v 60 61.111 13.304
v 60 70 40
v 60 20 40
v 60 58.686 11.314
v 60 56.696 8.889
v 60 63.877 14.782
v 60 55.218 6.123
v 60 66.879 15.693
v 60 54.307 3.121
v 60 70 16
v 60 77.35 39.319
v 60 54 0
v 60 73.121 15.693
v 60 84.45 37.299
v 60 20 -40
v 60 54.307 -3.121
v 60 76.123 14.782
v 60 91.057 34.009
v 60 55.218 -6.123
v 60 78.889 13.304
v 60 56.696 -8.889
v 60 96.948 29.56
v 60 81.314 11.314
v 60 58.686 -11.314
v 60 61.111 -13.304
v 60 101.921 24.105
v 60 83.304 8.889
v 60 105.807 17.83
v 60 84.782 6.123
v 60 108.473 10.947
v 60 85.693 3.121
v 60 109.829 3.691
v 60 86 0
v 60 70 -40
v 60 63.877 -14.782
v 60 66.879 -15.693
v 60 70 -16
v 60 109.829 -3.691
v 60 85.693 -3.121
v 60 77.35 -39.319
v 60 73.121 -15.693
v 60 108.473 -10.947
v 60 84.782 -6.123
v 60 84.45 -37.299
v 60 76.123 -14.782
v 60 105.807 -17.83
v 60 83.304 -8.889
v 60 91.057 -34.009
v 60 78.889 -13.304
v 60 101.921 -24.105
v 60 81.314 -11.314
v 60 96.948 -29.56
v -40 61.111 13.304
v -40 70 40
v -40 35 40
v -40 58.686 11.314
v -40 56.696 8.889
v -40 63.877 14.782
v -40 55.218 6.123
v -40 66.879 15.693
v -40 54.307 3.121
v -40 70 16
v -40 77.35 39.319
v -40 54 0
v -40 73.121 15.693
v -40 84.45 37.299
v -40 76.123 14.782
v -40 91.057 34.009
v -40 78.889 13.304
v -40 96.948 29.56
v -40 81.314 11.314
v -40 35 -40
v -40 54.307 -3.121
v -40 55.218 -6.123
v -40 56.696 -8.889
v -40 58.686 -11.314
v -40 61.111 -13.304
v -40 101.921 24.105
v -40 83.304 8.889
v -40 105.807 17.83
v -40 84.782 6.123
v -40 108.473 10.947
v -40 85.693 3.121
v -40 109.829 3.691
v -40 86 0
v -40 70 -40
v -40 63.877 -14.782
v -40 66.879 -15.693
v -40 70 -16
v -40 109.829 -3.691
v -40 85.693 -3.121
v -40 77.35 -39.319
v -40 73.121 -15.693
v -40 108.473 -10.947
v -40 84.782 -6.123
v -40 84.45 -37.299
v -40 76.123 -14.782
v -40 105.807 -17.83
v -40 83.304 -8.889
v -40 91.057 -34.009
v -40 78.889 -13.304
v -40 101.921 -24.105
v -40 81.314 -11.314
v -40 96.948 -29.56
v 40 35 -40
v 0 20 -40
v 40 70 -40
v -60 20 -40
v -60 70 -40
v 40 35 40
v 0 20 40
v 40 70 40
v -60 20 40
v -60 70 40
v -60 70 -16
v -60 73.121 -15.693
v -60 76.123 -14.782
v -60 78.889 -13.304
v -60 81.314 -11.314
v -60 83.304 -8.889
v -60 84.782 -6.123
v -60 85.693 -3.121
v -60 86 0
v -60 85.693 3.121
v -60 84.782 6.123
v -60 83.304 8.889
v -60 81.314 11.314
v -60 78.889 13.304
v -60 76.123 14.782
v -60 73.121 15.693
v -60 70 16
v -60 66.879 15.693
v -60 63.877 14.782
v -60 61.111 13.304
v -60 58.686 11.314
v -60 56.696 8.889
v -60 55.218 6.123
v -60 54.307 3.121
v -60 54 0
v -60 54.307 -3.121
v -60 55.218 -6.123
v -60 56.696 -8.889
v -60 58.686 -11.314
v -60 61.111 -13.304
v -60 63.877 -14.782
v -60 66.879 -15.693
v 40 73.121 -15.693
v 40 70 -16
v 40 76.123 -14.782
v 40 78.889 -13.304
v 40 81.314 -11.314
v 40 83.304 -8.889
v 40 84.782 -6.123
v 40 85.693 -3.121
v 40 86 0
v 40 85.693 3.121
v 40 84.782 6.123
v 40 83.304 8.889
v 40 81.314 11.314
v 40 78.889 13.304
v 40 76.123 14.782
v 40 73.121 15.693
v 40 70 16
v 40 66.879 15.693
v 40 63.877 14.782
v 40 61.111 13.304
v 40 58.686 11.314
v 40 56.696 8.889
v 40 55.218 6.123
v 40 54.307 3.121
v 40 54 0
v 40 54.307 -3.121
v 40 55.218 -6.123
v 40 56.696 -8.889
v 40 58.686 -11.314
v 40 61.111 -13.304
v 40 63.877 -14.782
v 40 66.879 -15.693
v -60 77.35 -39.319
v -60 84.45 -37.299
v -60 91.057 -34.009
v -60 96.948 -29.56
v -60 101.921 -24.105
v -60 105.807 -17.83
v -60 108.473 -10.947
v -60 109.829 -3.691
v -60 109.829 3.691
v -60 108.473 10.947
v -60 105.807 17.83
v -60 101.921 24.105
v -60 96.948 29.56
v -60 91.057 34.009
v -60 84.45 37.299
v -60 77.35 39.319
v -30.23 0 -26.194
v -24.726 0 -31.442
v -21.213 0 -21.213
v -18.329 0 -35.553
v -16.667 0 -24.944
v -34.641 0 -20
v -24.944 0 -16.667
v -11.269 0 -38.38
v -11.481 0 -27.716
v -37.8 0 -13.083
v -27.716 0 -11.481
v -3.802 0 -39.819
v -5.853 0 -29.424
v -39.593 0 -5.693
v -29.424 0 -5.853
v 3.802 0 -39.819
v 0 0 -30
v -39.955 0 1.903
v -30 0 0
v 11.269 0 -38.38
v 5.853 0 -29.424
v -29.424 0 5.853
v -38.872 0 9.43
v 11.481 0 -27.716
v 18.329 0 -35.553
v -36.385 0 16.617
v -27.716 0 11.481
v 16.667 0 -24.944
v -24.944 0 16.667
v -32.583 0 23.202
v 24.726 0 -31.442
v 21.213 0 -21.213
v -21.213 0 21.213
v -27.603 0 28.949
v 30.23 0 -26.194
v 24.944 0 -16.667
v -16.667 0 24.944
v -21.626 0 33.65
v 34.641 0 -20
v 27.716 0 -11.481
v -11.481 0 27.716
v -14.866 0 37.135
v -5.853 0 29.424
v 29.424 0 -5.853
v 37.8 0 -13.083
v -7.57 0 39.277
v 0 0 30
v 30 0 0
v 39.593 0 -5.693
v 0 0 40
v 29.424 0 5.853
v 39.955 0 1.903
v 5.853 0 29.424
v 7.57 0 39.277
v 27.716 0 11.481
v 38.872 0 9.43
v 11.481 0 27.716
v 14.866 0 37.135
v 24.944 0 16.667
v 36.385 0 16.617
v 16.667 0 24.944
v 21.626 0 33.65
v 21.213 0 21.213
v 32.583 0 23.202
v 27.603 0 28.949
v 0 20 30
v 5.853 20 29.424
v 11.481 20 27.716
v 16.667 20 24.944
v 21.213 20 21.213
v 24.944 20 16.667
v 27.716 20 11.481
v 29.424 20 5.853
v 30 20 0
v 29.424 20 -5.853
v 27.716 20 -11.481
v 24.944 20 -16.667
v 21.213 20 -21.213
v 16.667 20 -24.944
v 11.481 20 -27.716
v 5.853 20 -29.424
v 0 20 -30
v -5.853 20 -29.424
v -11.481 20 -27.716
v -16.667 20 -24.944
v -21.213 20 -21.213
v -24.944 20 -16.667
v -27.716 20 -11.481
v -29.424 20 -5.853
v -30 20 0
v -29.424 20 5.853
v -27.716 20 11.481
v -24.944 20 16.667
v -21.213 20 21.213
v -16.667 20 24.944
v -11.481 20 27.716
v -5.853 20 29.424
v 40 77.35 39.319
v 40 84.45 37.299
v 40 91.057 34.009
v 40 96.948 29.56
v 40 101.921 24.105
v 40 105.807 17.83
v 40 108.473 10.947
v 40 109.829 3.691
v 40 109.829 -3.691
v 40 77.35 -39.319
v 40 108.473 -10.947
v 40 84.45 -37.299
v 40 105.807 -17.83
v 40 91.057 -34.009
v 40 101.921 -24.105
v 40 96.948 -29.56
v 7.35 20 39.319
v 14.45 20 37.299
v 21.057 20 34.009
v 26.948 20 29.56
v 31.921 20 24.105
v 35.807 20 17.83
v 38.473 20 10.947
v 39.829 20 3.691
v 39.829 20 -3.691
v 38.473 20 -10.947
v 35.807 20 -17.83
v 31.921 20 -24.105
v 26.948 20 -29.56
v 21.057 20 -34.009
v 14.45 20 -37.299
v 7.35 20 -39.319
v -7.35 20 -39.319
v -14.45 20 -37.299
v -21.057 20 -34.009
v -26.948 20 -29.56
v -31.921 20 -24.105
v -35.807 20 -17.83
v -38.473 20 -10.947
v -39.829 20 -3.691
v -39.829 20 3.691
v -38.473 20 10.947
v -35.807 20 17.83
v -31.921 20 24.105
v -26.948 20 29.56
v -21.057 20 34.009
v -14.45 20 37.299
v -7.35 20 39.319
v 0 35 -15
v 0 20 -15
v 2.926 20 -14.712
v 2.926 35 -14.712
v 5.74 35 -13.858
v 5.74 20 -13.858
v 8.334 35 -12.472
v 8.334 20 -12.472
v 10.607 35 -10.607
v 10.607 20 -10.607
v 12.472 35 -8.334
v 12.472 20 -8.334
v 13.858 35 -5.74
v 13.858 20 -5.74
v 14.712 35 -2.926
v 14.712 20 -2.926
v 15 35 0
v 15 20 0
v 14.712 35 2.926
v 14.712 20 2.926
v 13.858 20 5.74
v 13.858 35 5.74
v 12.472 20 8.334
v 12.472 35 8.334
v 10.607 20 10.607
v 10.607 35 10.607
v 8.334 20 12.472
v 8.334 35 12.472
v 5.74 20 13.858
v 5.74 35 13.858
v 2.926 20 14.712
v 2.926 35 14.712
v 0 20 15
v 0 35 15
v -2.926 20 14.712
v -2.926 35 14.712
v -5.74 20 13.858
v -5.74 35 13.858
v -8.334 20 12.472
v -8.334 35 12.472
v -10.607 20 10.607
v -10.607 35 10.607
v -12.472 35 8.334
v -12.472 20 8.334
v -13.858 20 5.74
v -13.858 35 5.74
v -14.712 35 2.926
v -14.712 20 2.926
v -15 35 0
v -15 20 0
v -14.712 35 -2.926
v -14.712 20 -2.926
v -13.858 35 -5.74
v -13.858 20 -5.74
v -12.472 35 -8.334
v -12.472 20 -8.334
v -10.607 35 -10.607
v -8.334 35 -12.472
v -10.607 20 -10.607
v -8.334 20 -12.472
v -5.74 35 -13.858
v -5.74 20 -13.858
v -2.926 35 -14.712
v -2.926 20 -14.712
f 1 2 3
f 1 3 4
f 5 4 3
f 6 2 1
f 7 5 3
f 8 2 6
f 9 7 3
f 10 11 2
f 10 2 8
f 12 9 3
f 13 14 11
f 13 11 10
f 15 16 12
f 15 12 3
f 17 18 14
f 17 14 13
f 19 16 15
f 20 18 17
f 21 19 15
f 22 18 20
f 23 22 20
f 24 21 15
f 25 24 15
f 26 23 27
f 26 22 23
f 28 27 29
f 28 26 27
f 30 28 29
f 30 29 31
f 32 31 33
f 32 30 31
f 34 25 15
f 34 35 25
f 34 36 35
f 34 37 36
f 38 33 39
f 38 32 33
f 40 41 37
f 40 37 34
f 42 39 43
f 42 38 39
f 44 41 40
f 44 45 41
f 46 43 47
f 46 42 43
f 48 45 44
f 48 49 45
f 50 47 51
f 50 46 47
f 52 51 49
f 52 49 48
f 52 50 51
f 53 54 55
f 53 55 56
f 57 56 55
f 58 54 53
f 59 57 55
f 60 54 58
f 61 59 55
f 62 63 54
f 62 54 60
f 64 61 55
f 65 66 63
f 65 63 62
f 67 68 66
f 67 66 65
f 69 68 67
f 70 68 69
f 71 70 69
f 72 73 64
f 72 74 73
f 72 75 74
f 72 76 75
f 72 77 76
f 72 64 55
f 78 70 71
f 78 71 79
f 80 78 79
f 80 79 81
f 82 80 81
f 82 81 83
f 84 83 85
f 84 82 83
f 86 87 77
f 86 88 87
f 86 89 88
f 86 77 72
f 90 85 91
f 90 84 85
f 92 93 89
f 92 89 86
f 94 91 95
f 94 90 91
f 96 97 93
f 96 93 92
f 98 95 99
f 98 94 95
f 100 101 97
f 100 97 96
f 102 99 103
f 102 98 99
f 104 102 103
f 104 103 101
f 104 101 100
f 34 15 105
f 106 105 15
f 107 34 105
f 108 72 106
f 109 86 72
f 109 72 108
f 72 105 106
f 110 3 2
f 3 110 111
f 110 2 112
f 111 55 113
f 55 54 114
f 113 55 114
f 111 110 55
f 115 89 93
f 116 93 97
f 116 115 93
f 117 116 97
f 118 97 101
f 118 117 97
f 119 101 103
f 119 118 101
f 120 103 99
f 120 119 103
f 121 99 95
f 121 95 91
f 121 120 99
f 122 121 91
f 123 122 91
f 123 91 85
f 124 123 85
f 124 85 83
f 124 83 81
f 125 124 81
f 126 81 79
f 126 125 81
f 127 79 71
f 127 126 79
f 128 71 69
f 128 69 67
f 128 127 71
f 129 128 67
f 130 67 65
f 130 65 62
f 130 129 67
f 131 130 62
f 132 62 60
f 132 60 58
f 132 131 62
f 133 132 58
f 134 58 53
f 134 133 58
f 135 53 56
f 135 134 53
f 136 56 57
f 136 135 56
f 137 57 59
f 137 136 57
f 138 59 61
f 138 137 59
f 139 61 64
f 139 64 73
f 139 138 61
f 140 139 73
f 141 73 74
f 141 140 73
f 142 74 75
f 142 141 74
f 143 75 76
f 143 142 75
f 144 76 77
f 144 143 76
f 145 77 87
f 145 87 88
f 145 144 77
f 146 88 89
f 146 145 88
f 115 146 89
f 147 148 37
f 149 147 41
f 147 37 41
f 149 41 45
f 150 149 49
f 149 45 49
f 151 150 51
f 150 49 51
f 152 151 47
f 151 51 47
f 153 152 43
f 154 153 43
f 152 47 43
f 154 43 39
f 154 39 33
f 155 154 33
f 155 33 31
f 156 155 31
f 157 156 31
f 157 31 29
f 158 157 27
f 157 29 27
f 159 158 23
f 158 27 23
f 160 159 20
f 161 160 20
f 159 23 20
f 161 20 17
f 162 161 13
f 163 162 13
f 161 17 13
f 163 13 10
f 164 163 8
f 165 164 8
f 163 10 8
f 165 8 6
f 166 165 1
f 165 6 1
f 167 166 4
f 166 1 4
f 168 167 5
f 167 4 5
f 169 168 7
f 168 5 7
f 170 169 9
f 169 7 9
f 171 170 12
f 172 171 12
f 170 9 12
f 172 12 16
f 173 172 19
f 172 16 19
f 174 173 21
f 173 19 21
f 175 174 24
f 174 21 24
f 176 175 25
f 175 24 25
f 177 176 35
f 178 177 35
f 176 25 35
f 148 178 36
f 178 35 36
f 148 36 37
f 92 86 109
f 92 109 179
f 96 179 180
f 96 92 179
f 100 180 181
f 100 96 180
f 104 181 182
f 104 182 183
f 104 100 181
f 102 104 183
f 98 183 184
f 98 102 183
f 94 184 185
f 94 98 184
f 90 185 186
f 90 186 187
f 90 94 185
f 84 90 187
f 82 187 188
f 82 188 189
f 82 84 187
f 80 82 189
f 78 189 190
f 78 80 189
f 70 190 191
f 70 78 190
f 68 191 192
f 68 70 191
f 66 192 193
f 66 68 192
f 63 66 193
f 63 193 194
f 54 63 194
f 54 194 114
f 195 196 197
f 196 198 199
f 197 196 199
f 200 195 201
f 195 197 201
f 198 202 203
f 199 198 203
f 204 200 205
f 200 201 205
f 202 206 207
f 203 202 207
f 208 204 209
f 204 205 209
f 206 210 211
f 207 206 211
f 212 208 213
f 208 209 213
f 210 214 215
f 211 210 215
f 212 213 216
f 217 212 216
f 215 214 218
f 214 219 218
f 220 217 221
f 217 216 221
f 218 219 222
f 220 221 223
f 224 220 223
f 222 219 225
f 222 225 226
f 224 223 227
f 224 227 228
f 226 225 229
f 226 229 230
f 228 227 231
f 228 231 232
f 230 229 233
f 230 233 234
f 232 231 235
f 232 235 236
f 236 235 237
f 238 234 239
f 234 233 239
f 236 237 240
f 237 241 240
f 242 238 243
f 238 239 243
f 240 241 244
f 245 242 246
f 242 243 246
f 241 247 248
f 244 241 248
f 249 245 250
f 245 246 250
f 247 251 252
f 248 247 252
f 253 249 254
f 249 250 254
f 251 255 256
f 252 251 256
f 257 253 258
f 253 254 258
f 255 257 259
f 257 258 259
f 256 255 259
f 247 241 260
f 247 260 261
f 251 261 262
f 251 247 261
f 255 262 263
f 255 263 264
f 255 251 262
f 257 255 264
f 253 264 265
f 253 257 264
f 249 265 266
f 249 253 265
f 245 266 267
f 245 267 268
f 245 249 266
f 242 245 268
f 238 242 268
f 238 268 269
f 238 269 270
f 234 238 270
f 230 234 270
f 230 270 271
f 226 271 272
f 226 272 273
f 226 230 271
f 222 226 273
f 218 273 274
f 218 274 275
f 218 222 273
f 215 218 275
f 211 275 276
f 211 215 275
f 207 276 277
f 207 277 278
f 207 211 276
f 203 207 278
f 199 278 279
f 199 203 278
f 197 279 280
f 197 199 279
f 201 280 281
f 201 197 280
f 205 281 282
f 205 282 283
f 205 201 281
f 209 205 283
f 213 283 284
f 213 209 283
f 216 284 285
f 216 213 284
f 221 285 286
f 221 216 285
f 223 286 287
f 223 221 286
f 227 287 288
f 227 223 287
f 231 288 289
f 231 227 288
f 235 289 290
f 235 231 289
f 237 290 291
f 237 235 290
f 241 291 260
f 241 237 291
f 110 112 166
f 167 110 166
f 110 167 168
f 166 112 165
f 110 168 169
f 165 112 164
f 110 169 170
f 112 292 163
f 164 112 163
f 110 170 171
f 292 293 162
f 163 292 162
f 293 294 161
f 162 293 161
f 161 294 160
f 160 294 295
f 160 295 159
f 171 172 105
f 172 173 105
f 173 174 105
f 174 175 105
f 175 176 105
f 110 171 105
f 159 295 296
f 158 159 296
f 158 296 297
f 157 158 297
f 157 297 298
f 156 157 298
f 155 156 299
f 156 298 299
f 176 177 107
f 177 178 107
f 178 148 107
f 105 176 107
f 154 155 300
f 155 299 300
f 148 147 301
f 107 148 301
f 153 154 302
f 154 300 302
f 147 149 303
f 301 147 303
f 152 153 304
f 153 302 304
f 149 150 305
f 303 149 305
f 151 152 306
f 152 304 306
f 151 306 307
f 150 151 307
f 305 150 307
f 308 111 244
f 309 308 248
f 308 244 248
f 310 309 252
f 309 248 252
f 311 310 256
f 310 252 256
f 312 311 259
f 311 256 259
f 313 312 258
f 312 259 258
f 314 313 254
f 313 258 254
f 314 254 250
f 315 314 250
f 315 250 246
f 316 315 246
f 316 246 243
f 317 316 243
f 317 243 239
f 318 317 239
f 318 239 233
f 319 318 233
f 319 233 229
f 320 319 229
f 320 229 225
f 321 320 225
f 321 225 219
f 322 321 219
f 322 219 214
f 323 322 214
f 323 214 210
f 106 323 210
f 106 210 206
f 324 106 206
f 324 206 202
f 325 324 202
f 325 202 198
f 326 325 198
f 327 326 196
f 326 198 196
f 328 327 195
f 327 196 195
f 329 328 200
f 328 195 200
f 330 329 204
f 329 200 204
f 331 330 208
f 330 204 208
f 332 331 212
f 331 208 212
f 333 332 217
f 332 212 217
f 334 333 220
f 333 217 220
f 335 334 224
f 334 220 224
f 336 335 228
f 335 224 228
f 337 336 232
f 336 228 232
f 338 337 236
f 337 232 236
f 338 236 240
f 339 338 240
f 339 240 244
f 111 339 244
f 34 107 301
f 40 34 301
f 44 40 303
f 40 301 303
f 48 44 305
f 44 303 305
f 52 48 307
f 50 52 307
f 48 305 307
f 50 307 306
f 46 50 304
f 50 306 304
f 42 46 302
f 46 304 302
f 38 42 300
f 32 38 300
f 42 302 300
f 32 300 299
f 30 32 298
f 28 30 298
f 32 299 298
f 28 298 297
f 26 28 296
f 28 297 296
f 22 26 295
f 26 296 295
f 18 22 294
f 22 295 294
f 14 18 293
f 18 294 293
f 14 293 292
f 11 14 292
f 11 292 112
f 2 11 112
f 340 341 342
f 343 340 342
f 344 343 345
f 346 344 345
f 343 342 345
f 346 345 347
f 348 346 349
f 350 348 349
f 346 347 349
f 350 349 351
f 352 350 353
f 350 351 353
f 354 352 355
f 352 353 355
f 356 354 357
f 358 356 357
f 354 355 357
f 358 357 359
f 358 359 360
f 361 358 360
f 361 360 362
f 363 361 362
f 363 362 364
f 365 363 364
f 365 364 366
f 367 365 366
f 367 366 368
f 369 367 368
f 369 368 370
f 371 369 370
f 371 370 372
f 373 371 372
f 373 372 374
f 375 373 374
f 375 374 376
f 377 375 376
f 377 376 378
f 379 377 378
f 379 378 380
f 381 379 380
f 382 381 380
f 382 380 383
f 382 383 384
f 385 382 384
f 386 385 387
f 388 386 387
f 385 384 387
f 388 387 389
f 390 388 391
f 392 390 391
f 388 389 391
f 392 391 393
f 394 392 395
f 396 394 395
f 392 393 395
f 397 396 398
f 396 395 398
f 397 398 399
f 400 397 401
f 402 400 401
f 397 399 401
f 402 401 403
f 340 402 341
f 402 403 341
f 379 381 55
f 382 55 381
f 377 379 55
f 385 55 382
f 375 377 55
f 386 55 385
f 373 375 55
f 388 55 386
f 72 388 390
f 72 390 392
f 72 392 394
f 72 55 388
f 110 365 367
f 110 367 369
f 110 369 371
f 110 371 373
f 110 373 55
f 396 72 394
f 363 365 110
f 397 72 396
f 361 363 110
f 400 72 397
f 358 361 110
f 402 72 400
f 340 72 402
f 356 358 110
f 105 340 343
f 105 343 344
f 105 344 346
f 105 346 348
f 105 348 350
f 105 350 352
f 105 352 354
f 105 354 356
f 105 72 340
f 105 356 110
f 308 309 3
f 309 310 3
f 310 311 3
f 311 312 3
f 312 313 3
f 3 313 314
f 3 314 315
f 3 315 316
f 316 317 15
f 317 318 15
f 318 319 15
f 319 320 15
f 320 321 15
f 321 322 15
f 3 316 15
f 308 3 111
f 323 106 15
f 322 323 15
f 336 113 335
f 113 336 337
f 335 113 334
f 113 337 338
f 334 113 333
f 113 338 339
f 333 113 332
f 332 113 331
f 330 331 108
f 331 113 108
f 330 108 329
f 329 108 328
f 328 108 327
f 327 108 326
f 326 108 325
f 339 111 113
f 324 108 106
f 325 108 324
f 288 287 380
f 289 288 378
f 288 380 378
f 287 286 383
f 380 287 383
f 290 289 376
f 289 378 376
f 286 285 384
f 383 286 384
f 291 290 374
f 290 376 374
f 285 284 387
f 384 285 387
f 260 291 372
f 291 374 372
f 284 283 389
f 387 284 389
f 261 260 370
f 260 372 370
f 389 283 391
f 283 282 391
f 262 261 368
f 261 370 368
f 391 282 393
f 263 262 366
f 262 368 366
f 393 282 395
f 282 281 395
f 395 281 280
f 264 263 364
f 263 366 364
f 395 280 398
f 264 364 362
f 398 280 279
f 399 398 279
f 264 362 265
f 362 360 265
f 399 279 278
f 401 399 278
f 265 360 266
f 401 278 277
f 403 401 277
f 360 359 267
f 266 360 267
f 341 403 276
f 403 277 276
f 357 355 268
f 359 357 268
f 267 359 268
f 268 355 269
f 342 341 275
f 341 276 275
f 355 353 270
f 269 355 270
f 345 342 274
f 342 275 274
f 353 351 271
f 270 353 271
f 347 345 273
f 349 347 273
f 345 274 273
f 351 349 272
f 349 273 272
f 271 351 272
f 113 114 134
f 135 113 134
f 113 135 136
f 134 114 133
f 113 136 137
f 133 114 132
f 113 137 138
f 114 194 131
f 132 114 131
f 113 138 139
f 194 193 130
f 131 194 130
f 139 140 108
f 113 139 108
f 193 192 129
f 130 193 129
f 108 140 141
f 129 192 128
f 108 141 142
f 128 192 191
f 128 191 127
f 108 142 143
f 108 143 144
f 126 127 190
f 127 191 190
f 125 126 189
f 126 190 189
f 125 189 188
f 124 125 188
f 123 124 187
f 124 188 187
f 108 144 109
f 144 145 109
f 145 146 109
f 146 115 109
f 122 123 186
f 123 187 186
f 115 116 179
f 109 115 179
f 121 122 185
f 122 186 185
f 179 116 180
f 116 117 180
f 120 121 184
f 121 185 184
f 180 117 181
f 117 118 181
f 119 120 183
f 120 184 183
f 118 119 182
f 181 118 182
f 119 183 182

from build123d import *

# Parameters (mm, degrees)
SKETCH1_R           = 40
SKETCH1_R_2         = 30
BOSS_EXTRUDE2_DEPTH = 20
SKETCH2_W           = 120
SKETCH2_H           = 80
BOSS_EXTRUDE3_DEPTH = 15
SKETCH3_R           = 15
CUT_EXTRUDE1_DEPTH  = 37
SKETCH7_W           = 20
SKETCH7_H           = 35
BOSS_EXTRUDE5_DEPTH = 80
BOSS_EXTRUDE6_DEPTH = 20
SKETCH9_R           = 16
CUT_EXTRUDE2_DEPTH  = 20


with BuildPart() as part:
    # Sketch1 → Boss-Extrude2 (new body)
    with BuildSketch(Plane(origin=(0, 0, 0), x_dir=(1, 0, 0), z_dir=(0, 1, 0))):
        with Locations(Location((0, 0, 0), (0, 0, 270))):
            Circle(SKETCH1_R)
        with Locations(Location((0, 0, 0), (0, 0, 270))):
            Circle(SKETCH1_R_2, mode=Mode.SUBTRACT)
    extrude(amount=BOSS_EXTRUDE2_DEPTH)

    # Sketch2 → Boss-Extrude3 (add)
    with BuildSketch(Plane(origin=(0, 20, 0), x_dir=(1, 0, 0), z_dir=(0, 1, 0))):
        Rectangle(SKETCH2_W, SKETCH2_H)
    extrude(amount=BOSS_EXTRUDE3_DEPTH)

    # Sketch3 → Cut-Extrude1 (cut)
    with BuildSketch(Plane.XZ.offset(-20)):
        with Locations(Location((0, 0, 0), (0, 0, 270))):
            Circle(SKETCH3_R)
    extrude(amount=-CUT_EXTRUDE1_DEPTH, mode=Mode.SUBTRACT)

    # Sketch7 → Boss-Extrude5 (add)
    with BuildSketch(Plane.XY.offset(40)):
        with Locations((50, 52.5)):
            Rectangle(SKETCH7_W, SKETCH7_H)
    boss_extrude5 = extrude(amount=-BOSS_EXTRUDE5_DEPTH)

    # Sketch8 → Boss-Extrude6 (add)
    with BuildSketch(Plane.ZY.offset(-40)):
        with BuildLine():
            Line((40, 70), (-40, 70))
            ThreePointArc((-40, 70), (0, 110), (40, 70))
        make_face()
    boss_extrude6 = extrude(amount=-BOSS_EXTRUDE6_DEPTH)

    # Sketch9 → Cut-Extrude2 (cut)
    with BuildSketch(Plane(origin=(60, 0, 0), x_dir=(0, 0, -1), z_dir=(1, 0, 0))):
        with Locations((0, 70)):
            Circle(SKETCH9_R)
    cut_extrude2 = extrude(amount=-CUT_EXTRUDE2_DEPTH, mode=Mode.SUBTRACT)

    # Mirror1: Boss-Extrude5, Boss-Extrude6, Cut-Extrude2 across plane
    add(boss_extrude5.mirror(Plane(origin=(0, 0, 0), x_dir=(0, 0, 1), z_dir=(1, 0, 0))))
    add(boss_extrude6.mirror(Plane(origin=(0, 0, 0), x_dir=(0, 0, 1), z_dir=(1, 0, 0))))
    add(cut_extrude2.mirror(Plane(origin=(0, 0, 0), x_dir=(0, 0, 1), z_dir=(1, 0, 0))), mode=Mode.SUBTRACT)


solid = part.part
